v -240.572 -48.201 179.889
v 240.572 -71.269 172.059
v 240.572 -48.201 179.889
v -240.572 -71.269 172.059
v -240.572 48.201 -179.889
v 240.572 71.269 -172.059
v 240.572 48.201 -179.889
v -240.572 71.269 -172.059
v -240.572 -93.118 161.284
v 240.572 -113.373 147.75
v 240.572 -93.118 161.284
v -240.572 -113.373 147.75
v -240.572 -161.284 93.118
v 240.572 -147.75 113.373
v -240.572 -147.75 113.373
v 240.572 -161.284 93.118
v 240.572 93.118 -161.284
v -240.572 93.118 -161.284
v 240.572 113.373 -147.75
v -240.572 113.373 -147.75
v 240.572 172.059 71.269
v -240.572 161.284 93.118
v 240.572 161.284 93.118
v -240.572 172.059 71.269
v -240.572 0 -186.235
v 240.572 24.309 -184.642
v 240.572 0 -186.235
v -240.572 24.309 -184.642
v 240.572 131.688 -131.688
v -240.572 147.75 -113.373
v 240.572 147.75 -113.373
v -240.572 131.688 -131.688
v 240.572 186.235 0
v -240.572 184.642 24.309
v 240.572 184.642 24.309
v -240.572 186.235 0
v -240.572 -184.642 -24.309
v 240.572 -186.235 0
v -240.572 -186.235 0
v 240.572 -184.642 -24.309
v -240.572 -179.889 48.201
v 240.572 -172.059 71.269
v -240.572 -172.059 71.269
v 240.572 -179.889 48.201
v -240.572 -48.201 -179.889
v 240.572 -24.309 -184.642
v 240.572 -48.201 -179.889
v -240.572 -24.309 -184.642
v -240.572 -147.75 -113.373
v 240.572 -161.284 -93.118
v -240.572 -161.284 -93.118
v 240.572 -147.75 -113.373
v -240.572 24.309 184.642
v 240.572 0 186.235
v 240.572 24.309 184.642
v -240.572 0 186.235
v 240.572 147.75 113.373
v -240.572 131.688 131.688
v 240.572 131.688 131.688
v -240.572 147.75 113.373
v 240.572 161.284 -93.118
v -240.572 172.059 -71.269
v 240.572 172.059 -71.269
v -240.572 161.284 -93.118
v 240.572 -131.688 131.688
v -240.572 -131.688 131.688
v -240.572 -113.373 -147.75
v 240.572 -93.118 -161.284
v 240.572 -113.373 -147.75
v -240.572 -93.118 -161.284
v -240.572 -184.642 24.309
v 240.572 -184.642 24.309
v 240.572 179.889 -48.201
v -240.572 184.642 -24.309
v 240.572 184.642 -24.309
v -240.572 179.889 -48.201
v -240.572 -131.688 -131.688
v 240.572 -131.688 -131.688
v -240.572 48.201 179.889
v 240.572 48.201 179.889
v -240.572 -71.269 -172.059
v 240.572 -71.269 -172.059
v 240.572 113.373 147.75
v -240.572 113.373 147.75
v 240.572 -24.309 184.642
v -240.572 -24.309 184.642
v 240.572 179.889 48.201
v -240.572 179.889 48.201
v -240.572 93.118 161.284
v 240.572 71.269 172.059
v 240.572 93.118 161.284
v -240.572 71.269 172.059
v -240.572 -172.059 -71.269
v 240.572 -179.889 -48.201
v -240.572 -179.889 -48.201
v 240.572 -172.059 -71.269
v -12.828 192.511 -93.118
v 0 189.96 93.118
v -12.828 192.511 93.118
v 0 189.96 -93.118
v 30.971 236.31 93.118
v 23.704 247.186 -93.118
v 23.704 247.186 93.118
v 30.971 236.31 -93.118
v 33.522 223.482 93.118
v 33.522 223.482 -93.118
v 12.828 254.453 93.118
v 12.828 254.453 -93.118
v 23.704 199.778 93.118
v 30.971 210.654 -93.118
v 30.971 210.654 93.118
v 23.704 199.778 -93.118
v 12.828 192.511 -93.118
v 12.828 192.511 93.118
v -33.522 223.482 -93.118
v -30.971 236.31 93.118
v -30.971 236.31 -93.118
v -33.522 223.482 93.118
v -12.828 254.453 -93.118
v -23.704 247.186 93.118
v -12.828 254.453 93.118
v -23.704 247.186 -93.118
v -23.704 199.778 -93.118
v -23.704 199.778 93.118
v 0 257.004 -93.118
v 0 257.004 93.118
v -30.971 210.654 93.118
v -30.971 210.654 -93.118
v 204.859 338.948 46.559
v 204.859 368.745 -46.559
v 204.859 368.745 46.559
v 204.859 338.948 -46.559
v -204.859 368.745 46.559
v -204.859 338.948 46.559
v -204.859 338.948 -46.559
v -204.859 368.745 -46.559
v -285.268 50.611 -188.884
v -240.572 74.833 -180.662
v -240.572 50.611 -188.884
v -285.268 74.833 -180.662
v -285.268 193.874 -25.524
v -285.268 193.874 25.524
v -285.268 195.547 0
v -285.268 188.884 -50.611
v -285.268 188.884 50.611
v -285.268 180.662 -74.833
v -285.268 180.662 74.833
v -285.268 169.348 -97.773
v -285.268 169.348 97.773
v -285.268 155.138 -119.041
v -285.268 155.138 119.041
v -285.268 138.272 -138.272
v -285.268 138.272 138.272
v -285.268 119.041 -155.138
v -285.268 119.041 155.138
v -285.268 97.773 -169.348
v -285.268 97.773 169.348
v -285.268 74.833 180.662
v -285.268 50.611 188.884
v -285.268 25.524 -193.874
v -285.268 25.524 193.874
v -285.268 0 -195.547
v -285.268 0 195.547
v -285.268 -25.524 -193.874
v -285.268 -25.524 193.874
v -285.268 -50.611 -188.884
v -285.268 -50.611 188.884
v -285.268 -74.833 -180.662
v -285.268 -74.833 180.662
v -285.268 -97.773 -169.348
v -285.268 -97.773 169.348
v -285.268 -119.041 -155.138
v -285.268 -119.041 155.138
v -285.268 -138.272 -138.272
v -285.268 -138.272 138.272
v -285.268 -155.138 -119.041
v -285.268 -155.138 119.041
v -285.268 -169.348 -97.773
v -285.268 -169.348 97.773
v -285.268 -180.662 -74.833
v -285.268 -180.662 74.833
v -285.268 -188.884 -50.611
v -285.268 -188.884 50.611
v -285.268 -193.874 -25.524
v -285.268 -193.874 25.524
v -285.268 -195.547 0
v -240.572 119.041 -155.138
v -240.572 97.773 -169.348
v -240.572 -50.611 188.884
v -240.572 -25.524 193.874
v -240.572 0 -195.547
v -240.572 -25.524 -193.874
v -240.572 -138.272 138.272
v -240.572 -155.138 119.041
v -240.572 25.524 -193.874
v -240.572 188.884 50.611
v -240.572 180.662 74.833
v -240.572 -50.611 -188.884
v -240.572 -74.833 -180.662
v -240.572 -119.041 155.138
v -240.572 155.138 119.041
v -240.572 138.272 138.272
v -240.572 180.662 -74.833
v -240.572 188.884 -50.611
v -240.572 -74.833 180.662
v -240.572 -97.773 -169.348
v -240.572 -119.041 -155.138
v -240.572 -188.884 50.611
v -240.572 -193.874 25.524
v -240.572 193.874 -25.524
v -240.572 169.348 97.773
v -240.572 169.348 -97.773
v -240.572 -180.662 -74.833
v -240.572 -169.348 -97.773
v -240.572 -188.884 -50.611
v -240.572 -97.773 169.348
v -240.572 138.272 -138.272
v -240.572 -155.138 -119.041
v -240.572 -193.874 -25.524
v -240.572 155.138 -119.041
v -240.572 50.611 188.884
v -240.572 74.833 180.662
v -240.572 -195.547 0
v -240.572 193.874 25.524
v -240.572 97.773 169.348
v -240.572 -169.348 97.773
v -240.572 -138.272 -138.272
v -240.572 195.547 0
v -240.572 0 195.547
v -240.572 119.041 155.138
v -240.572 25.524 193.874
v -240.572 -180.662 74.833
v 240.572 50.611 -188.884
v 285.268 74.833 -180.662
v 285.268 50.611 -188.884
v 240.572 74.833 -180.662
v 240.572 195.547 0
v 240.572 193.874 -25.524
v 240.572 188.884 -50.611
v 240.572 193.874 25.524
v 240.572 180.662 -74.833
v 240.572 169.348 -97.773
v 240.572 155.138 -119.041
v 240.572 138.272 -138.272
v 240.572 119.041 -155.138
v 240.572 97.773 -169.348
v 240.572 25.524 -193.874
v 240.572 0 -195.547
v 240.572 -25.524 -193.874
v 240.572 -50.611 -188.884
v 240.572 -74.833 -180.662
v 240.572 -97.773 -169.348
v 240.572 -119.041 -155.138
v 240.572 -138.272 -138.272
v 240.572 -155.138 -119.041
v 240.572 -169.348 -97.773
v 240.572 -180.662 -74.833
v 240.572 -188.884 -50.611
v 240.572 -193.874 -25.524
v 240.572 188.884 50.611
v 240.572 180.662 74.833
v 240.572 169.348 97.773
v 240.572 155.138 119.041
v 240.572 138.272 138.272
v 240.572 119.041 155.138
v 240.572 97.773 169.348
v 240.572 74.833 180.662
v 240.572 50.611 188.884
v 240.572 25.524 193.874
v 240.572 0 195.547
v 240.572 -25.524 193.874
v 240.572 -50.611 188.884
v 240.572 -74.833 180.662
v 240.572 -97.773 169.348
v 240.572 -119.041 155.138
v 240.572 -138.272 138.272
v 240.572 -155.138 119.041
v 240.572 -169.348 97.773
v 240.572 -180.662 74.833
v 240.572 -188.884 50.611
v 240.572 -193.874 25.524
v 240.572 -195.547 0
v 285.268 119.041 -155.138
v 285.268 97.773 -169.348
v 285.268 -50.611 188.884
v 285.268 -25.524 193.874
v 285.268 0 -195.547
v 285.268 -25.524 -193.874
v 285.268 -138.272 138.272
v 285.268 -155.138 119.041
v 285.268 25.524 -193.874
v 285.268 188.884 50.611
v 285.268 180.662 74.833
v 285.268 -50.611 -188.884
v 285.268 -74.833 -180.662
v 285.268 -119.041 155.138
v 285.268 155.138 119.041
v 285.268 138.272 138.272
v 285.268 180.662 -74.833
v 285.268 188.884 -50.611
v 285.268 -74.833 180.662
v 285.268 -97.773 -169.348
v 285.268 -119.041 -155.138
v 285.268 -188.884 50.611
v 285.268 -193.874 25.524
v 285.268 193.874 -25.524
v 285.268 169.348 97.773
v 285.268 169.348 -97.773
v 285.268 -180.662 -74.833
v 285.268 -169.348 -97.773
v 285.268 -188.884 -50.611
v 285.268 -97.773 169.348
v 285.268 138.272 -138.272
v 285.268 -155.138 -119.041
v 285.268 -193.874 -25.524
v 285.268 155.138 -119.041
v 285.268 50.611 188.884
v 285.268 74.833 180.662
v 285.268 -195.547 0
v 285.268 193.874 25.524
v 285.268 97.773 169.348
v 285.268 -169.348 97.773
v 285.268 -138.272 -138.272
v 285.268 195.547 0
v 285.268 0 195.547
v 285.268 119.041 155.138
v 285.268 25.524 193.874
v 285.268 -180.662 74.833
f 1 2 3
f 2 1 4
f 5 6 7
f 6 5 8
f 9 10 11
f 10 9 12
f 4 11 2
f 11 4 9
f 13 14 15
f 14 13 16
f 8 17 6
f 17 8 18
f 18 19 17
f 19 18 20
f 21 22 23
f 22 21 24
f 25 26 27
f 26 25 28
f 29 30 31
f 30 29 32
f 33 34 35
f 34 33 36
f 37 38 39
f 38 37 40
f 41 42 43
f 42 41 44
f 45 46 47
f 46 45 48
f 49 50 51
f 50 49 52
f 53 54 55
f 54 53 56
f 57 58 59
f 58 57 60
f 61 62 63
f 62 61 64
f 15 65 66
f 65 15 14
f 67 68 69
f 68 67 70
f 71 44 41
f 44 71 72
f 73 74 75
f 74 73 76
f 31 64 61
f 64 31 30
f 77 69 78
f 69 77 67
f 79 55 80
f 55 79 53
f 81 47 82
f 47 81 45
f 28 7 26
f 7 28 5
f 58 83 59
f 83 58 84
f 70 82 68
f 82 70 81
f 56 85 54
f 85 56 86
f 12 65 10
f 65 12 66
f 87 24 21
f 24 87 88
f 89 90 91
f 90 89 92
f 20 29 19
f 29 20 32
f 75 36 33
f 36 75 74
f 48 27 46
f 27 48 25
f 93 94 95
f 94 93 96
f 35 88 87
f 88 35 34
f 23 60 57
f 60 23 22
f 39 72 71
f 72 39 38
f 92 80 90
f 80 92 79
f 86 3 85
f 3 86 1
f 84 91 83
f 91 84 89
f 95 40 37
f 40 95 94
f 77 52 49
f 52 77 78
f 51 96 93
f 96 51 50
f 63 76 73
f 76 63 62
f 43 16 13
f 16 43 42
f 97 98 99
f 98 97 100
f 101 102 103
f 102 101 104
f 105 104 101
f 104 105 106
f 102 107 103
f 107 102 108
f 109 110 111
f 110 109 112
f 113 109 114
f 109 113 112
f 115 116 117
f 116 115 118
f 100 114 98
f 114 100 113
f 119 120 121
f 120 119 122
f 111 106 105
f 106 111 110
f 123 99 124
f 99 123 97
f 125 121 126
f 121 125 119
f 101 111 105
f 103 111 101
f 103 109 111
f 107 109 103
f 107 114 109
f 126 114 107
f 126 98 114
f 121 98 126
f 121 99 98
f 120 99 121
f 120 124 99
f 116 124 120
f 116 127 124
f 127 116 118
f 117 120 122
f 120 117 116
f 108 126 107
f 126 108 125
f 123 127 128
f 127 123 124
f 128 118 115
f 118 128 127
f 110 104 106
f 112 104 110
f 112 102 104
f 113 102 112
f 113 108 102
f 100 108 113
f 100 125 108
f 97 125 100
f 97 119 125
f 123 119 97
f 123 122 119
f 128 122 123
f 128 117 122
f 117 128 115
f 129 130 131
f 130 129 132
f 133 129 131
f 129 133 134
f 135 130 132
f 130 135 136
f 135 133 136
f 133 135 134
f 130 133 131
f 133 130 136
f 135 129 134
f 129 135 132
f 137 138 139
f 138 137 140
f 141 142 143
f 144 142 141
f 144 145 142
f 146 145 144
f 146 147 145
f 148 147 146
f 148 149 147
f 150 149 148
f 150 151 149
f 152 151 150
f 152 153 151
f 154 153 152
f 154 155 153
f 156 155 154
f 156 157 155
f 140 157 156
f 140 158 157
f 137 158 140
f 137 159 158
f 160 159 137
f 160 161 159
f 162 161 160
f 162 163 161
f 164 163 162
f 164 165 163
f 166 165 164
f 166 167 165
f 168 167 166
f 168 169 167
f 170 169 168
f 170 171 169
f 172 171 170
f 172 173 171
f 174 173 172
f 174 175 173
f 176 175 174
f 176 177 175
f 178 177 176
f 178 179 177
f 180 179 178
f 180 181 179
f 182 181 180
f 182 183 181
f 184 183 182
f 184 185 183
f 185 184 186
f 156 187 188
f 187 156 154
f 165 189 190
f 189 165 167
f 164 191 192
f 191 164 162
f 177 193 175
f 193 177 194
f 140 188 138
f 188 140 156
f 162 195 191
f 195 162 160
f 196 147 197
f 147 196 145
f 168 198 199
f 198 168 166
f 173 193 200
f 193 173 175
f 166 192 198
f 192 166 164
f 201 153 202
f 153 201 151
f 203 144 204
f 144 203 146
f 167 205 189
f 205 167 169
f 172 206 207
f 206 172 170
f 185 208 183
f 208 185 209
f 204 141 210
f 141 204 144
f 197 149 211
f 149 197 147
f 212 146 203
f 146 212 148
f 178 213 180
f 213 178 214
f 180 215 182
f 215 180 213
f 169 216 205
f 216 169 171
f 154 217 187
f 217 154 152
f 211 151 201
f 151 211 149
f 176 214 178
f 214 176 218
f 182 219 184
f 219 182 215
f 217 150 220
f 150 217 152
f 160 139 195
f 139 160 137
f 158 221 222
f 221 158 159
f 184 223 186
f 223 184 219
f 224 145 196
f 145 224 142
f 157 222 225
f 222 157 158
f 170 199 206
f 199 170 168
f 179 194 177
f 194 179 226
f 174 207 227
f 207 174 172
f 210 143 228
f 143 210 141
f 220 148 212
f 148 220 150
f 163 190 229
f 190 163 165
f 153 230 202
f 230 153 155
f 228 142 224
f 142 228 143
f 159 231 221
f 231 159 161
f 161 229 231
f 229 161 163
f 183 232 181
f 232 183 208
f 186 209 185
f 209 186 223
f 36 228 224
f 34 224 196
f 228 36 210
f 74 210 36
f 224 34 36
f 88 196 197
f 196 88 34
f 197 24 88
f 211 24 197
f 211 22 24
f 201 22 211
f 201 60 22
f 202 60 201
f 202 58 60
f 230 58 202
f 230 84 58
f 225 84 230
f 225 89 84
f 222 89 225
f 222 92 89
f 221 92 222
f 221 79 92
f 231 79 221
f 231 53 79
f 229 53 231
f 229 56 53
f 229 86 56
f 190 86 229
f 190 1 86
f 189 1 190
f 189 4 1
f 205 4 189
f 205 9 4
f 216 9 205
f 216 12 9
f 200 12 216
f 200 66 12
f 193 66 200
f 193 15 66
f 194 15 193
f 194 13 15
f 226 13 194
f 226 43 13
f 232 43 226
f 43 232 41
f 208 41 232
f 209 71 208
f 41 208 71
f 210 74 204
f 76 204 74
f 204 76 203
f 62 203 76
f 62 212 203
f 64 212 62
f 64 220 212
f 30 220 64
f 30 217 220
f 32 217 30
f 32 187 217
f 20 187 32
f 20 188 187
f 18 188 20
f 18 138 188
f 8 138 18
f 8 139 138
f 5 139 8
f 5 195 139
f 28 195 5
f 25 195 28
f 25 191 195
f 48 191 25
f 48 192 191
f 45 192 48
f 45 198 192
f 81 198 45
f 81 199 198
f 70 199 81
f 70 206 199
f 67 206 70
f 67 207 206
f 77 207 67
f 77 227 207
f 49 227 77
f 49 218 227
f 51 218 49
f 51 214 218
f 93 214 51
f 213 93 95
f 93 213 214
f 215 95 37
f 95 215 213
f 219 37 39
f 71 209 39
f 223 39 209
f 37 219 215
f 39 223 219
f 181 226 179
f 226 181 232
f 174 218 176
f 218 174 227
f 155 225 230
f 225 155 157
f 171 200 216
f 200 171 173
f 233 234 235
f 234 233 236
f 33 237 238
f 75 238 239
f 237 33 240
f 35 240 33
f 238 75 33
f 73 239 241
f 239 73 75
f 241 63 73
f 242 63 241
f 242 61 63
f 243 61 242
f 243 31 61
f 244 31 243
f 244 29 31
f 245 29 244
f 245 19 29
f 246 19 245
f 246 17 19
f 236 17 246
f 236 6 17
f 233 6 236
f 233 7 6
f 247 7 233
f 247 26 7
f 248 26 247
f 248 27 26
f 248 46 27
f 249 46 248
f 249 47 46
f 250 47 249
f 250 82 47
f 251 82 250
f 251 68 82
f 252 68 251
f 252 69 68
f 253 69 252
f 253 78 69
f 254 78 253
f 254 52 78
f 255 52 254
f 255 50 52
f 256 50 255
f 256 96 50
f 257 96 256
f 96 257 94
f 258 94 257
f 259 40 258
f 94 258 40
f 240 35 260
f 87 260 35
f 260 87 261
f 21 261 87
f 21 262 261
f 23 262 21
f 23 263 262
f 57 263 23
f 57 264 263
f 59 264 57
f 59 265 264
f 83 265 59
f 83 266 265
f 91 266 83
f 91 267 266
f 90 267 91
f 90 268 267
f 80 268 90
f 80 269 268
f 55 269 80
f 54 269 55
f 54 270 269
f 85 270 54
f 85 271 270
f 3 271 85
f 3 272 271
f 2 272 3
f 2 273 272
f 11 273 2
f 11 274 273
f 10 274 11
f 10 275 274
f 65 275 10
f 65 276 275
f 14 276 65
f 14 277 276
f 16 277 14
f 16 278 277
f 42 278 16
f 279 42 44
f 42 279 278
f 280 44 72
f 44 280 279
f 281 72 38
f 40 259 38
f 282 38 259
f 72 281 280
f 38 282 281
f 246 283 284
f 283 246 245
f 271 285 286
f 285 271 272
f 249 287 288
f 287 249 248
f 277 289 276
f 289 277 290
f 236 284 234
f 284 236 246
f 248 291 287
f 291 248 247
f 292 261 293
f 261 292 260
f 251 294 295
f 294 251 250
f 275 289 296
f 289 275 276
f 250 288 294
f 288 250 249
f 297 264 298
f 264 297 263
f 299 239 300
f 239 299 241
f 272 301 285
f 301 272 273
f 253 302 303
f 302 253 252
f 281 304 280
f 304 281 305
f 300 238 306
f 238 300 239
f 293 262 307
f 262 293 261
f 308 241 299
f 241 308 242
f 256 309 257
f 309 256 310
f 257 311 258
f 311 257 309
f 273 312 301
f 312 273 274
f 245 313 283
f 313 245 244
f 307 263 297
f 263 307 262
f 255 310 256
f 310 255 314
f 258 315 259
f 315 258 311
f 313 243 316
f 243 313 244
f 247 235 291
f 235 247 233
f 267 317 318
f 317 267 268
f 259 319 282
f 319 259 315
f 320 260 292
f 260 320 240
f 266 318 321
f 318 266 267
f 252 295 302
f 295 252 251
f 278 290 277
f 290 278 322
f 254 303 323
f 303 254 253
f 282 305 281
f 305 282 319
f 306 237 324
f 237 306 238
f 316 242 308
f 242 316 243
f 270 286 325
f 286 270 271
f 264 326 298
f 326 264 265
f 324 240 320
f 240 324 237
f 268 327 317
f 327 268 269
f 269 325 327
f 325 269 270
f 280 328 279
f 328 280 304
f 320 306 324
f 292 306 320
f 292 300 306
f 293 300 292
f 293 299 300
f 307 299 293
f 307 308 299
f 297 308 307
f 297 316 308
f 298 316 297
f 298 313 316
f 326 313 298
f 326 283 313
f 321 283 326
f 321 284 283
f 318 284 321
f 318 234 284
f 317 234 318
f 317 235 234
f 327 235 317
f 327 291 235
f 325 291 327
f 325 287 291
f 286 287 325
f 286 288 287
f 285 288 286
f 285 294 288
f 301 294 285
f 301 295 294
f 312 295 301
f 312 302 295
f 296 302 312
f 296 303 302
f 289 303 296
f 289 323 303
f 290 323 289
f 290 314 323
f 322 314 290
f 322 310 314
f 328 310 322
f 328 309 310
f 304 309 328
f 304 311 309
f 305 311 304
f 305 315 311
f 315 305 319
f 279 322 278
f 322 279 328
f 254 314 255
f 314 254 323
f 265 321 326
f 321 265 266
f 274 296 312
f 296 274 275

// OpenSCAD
// Auto-generated by scripts/author_from_manifest.py (Phase D.3).
// Source: data/phase_d_manifest.json (sku_intent='nibco-lc-2000-butterfly-8in').
// Do not hand-edit — regenerate from the manifest.
//
// @part nibco_lc_2000_butterfly_8in
// @kind valve
// @category valve.butterfly
// @display-name "Nibco LC-2000 Grooved Butterfly Valve 8\" w/ Tamper Switch"
// @mfg nibco
// @mfg-pn LC-2000
// @listing UL FM
// @price-usd 380.00
// @install-minutes 30
// @crew foreman
// @param size_in number default=8 label="Size" unit="in"
// @port inlet position=[-0.05,0,0] direction=[-1,0,0] style=grooved size_in=8 role=run_a
// @port outlet position=[0.05,0,0] direction=[1,0,0] style=grooved size_in=8 role=run_b

size_in = 8.0;

function od_mm(nps) =
    nps ==   1  ? 33.4 :
    nps == 1.25 ? 42.2 :
    nps == 1.5  ? 48.3 :
    nps ==   2  ? 60.3 :
    nps == 2.5  ? 73.0 :
    nps ==   3  ? 88.9 :
    nps ==   4  ? 114.3 :
    nps ==   6  ? 168.3 :
    nps ==   8  ? 219.1 : 73.0;

od = od_mm(size_in);
body_len = od * 2.4;
body_d   = od * 1.7;

union() {
    // Valve body
    rotate([0, 90, 0])
        cylinder(h = body_len, d = body_d, center = true, $fn = 48);
    // Stem / handle indicator
    translate([0, body_d * 0.6, 0])
        cylinder(h = body_d * 0.5, d = body_d * 0.18, center = true, $fn = 16);
    translate([0, body_d * 0.95, 0])
        cube([body_d * 1.1, body_d * 0.08, body_d * 0.25], center = true);
    // End flanges
    translate([-body_len/2, 0, 0])
        rotate([0, 90, 0])
        cylinder(h = body_d * 0.12, d = body_d * 1.05, center = true, $fn = 48);
    translate([ body_len/2, 0, 0])
        rotate([0, 90, 0])
        cylinder(h = body_d * 0.12, d = body_d * 1.05, center = true, $fn = 48);
}
